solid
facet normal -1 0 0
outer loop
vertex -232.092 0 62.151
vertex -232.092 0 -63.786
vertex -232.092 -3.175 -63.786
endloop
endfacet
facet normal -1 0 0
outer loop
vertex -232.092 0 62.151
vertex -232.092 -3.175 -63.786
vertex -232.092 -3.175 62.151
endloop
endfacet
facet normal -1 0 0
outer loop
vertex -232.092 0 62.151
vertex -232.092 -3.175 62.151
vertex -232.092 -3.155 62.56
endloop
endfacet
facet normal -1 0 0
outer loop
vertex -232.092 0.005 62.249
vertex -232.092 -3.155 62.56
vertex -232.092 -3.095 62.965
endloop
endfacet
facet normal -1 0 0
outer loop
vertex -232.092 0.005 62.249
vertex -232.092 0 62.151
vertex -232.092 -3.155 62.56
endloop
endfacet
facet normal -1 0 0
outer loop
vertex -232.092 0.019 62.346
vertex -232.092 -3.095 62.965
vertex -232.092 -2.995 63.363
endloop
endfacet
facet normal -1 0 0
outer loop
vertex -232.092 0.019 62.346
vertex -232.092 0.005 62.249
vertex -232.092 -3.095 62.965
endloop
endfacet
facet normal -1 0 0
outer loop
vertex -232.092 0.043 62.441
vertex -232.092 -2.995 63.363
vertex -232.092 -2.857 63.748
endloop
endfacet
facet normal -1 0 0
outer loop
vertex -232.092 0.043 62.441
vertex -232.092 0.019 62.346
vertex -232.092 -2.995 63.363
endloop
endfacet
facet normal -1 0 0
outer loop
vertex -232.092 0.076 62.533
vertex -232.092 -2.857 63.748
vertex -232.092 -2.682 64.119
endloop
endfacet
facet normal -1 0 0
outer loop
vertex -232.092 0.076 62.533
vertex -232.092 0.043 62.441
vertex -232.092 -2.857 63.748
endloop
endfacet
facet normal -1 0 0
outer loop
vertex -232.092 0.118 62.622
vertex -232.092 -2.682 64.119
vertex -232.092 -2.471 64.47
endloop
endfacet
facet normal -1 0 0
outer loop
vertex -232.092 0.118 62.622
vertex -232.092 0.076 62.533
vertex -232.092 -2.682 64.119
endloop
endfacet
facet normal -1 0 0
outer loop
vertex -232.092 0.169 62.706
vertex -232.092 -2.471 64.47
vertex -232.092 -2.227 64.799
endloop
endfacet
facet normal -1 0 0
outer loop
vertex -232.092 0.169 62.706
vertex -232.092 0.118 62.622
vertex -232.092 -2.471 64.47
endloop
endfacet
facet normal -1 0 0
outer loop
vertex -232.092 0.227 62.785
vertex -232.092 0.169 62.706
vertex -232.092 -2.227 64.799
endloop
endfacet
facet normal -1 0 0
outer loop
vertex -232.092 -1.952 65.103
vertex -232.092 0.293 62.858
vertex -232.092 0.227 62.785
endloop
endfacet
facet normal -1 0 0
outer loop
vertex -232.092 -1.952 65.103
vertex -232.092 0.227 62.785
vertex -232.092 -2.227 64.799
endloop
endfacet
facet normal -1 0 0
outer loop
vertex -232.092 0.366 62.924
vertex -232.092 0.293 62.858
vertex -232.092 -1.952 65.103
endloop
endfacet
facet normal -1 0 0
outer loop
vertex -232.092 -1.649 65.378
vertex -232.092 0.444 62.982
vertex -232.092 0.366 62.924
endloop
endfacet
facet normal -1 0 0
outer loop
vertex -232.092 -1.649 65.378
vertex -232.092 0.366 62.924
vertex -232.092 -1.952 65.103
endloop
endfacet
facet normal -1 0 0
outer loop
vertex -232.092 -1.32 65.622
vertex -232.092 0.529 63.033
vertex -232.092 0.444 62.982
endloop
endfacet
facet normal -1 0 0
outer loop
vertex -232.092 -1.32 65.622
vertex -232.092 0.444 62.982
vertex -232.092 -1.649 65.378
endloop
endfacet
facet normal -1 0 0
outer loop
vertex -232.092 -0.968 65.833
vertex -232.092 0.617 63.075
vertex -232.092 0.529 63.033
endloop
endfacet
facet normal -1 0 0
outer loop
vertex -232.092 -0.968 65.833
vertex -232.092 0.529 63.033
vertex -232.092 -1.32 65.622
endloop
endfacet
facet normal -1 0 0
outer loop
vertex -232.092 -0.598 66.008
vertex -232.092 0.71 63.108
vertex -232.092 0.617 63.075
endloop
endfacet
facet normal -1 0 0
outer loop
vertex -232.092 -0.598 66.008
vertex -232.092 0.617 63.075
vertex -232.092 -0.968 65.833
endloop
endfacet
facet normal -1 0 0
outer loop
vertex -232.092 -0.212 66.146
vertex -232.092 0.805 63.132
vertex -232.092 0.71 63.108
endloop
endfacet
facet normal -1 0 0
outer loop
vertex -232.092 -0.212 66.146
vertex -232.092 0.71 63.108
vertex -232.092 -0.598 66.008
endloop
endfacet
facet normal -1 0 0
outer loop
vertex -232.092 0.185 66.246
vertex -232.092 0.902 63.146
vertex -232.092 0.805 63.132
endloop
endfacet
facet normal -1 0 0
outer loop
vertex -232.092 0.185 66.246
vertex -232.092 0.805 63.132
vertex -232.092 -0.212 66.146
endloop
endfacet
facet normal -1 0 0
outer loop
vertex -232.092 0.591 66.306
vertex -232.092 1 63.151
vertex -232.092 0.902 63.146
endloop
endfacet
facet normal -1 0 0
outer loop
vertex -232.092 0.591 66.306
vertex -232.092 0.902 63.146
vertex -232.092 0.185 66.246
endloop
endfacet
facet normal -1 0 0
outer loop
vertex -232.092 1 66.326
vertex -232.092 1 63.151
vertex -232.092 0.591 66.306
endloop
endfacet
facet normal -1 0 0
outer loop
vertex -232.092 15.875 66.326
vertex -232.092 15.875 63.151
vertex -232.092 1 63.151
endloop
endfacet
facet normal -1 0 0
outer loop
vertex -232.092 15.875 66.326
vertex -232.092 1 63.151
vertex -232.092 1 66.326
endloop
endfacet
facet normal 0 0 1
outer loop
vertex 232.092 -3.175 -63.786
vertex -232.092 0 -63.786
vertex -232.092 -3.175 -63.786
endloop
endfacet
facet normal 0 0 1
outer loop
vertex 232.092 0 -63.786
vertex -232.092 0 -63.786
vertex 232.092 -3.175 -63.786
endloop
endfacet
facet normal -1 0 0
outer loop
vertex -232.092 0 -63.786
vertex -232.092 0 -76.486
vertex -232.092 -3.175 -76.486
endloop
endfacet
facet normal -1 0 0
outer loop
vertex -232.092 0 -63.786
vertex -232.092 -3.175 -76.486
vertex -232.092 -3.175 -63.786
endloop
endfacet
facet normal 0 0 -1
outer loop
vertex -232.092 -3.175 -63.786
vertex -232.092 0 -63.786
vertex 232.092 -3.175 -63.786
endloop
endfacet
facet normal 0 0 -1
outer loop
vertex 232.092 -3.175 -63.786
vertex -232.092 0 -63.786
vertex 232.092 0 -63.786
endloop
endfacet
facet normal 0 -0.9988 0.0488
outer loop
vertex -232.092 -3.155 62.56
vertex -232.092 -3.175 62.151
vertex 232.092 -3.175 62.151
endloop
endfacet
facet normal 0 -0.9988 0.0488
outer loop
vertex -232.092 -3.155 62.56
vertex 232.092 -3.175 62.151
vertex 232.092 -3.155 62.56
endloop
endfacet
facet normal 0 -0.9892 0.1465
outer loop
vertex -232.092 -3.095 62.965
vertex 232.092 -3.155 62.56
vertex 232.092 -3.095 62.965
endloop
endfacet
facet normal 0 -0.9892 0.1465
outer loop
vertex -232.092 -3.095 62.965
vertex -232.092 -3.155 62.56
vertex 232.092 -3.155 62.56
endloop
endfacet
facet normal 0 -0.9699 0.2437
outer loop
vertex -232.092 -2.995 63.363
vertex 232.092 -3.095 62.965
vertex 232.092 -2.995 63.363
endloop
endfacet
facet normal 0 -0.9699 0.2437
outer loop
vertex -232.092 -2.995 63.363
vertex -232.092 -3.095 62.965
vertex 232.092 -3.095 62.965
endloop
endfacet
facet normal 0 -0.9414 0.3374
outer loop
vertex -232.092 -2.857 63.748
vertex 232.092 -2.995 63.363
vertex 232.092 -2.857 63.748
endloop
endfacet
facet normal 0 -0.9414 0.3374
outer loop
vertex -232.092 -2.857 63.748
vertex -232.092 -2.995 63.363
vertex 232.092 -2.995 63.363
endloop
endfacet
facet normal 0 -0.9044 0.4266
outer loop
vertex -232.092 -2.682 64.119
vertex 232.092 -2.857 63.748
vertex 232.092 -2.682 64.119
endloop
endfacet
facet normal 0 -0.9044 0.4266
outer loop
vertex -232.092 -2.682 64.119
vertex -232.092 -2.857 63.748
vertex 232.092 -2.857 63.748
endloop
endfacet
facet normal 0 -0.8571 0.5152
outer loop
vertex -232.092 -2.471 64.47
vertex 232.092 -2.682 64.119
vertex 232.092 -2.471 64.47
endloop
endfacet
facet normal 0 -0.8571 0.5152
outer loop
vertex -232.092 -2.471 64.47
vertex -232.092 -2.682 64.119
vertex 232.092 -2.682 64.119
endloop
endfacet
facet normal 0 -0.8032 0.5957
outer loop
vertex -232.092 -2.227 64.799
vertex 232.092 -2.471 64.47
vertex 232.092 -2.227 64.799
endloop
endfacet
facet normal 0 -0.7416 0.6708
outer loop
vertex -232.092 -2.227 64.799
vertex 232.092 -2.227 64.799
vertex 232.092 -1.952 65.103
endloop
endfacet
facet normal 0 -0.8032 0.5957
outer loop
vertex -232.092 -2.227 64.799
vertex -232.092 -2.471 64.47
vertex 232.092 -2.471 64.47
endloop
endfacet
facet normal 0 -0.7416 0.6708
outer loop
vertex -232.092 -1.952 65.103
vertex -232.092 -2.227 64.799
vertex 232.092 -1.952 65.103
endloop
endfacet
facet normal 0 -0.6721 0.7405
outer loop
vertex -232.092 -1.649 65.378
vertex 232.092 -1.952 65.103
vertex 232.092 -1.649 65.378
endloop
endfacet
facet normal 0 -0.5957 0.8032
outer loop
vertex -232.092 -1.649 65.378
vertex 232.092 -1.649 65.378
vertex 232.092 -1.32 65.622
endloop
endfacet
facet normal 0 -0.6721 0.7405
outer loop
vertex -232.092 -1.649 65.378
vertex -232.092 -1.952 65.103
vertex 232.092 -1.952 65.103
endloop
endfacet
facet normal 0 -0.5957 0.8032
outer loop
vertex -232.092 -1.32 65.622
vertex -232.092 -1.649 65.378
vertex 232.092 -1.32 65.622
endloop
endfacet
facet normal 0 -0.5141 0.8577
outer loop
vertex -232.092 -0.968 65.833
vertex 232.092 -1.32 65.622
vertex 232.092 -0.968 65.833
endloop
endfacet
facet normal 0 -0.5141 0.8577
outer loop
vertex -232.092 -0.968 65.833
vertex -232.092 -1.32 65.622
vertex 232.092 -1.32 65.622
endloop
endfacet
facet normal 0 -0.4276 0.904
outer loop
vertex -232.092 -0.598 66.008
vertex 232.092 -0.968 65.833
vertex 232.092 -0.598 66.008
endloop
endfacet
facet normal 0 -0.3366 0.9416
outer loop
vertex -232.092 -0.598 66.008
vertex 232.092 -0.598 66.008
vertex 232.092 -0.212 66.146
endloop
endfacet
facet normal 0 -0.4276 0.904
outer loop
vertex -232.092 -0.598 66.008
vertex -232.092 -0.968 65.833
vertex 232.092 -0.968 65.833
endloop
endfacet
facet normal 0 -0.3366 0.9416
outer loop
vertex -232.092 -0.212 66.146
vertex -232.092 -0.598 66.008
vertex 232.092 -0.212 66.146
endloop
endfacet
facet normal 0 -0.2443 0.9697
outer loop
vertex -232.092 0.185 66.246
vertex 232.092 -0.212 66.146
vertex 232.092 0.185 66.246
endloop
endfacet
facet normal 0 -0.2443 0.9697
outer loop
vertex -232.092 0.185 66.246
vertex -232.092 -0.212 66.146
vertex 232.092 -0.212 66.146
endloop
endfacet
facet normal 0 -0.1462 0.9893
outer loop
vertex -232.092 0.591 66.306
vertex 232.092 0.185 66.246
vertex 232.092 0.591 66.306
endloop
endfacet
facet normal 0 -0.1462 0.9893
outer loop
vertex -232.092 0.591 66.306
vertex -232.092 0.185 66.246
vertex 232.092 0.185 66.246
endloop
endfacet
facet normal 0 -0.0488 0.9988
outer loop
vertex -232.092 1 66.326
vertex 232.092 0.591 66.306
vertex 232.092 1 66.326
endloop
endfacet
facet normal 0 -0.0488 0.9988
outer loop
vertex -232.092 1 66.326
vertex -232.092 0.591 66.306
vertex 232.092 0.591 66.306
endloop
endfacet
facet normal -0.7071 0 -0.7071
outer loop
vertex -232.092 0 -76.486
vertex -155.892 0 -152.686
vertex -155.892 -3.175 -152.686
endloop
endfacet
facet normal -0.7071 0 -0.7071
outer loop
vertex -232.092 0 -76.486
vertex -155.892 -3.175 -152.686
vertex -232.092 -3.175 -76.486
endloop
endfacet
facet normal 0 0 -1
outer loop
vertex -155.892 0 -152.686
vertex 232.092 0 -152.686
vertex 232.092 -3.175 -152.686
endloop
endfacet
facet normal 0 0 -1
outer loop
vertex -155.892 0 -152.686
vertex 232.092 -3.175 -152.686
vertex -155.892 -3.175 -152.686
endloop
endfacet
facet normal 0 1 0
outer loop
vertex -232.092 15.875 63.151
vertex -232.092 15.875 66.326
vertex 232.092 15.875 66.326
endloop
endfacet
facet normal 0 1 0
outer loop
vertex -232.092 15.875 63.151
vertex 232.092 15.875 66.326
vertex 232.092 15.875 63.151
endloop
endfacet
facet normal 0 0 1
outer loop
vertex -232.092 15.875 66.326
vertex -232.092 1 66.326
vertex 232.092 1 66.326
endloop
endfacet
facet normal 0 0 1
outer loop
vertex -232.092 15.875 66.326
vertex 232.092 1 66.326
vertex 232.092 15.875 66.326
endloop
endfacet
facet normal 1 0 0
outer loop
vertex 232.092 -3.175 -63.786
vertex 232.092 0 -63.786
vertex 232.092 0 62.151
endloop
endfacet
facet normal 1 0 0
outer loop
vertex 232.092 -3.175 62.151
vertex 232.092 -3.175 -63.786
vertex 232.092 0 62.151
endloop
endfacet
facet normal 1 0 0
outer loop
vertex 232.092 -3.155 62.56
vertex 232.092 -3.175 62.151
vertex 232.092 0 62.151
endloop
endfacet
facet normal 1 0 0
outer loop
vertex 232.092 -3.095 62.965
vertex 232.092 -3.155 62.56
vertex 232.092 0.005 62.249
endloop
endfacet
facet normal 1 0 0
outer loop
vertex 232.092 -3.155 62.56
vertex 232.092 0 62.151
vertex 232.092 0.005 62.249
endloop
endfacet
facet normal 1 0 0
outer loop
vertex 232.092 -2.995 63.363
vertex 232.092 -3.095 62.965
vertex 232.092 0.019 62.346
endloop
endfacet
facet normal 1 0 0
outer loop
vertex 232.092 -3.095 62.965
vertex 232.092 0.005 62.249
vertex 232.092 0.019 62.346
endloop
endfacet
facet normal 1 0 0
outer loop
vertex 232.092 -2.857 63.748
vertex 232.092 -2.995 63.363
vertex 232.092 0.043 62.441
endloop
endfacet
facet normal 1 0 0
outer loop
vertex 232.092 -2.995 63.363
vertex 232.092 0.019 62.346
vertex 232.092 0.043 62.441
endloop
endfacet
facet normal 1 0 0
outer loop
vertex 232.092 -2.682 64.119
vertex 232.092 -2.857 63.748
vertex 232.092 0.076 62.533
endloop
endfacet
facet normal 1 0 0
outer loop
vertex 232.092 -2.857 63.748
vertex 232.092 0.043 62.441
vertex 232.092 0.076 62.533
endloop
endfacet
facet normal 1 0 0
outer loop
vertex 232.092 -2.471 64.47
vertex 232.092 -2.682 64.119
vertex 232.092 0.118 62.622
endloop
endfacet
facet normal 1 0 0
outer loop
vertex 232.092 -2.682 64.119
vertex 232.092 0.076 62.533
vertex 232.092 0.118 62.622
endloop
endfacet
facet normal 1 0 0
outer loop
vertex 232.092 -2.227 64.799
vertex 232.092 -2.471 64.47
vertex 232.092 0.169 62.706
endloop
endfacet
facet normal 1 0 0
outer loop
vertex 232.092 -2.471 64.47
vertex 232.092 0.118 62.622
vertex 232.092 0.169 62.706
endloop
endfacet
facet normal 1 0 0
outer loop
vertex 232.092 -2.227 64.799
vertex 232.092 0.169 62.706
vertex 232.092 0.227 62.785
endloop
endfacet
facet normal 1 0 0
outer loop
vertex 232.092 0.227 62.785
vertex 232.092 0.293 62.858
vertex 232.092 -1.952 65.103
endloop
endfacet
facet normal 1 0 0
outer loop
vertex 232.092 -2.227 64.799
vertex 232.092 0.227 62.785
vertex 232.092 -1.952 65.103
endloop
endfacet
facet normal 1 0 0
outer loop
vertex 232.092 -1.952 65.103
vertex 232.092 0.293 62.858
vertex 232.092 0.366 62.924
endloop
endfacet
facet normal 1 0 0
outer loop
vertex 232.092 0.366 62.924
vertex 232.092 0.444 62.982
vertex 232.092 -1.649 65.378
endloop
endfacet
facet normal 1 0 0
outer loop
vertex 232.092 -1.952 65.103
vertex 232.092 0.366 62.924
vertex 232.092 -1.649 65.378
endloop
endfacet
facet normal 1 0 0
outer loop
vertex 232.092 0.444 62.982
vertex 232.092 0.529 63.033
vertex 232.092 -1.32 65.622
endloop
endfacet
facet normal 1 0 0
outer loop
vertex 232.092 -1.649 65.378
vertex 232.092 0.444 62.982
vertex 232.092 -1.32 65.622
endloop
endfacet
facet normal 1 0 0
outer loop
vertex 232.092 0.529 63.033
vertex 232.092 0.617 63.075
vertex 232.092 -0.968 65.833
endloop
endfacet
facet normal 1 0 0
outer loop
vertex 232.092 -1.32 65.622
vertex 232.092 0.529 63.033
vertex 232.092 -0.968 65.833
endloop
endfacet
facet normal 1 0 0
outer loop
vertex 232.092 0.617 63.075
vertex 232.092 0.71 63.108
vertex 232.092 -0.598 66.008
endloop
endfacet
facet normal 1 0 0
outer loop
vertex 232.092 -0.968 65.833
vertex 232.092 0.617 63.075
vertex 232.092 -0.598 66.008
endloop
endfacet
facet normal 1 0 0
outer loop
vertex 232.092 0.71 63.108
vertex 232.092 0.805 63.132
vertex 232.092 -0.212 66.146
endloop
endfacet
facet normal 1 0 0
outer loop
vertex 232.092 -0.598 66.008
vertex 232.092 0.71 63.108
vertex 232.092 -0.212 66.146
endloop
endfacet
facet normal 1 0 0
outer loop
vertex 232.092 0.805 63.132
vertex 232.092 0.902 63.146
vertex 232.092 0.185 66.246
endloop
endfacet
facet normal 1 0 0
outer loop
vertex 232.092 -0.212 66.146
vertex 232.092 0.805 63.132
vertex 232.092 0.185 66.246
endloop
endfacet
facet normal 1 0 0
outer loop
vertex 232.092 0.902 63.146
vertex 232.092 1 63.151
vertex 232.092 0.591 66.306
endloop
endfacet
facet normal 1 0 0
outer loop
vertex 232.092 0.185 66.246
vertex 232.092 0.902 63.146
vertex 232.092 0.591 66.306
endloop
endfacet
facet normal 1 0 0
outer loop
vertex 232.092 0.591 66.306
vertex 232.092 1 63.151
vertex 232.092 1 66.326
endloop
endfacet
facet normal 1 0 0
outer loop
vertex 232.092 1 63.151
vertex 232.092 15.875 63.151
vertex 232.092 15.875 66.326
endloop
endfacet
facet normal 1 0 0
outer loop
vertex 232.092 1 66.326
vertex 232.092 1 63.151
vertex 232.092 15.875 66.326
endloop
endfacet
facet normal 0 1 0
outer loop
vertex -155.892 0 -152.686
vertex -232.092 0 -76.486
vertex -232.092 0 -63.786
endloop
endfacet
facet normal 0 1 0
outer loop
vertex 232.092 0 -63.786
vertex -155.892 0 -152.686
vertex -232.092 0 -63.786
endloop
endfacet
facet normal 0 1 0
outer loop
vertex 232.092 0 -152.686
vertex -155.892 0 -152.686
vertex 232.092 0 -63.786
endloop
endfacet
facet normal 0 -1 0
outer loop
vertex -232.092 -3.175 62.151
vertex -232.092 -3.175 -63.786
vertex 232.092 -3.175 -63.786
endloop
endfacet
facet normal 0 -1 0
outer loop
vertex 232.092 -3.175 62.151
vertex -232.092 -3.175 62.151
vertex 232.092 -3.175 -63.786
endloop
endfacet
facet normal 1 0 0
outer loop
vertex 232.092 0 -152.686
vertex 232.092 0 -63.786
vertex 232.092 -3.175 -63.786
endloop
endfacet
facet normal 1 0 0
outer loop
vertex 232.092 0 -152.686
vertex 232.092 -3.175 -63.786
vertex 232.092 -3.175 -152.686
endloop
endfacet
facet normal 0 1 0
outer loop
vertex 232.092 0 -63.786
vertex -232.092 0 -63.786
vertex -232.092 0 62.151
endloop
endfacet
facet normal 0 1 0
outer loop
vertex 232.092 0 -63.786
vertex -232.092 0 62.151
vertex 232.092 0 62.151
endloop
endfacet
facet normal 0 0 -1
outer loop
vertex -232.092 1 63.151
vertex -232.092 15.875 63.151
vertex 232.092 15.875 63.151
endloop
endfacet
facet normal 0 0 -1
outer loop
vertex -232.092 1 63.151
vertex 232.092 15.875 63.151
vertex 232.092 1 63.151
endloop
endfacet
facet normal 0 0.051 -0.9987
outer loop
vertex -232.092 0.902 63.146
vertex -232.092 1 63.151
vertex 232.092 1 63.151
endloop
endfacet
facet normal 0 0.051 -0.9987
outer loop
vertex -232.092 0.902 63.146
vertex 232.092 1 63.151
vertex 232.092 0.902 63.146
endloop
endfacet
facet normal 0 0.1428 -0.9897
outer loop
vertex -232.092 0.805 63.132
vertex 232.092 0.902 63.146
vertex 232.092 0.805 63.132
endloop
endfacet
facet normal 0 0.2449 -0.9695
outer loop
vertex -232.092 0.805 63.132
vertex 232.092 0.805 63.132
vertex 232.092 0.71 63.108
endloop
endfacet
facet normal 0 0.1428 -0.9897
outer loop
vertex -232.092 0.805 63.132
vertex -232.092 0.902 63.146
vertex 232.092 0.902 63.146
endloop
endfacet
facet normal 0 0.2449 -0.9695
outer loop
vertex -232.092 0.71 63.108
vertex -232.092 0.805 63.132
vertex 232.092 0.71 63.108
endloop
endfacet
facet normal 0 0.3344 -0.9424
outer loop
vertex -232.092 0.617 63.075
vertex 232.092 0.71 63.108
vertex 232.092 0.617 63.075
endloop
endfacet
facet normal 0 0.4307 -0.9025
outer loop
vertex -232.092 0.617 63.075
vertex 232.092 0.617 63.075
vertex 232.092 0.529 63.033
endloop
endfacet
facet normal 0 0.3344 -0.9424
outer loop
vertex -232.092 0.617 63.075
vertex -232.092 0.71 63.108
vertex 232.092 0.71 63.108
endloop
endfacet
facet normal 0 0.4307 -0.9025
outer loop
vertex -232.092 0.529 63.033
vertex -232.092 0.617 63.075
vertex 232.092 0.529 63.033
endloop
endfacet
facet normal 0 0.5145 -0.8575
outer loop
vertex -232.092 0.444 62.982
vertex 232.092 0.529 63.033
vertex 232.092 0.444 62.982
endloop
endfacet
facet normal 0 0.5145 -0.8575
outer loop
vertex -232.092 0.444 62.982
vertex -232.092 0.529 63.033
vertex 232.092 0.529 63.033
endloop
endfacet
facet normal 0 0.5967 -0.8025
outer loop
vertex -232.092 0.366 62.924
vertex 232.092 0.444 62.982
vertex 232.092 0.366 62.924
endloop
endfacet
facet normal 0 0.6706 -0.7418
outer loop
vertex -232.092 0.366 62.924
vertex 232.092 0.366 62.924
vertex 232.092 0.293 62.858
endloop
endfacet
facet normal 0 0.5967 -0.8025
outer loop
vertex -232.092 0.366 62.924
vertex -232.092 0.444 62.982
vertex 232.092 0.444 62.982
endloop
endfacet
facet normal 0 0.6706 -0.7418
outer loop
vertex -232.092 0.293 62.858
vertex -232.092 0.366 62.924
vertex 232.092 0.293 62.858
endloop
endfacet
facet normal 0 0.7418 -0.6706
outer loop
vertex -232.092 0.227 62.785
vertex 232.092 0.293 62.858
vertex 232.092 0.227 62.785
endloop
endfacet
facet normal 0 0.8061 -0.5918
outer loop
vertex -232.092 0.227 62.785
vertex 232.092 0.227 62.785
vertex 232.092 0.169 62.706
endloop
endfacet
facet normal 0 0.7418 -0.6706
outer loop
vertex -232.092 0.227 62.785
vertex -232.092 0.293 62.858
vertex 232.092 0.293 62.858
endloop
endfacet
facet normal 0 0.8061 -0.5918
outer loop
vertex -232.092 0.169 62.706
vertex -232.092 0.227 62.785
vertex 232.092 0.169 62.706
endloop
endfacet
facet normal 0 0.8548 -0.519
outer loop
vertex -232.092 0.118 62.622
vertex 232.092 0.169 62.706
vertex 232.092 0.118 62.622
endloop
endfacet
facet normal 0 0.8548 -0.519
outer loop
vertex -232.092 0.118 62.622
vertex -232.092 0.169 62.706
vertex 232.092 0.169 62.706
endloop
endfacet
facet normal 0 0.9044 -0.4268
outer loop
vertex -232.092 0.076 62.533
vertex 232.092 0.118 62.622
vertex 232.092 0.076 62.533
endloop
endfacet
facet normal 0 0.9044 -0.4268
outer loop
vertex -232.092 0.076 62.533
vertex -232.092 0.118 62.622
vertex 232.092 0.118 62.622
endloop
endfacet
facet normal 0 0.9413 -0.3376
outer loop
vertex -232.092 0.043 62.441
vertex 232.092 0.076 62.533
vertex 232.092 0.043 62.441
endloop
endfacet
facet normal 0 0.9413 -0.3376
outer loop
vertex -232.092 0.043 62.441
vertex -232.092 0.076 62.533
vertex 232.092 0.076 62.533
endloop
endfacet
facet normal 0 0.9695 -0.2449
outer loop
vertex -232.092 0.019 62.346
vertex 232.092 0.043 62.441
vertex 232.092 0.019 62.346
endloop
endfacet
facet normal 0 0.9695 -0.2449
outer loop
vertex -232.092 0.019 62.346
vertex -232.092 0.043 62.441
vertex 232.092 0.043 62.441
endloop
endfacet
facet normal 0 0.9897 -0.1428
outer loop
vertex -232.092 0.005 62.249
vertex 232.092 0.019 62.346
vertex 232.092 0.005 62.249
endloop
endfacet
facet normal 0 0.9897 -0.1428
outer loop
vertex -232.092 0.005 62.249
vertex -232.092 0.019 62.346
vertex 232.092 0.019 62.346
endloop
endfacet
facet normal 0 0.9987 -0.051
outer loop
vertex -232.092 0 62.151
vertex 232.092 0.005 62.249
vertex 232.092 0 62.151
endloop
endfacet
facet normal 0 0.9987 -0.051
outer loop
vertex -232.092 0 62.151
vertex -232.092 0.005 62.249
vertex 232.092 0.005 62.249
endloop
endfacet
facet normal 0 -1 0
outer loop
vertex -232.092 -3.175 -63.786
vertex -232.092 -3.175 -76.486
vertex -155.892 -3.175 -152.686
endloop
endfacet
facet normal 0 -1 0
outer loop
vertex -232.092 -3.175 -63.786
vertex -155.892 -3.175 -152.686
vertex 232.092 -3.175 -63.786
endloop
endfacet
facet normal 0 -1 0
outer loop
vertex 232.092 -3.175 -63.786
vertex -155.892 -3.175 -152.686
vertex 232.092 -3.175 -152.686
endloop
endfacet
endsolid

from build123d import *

# Parameters (mm, degrees)
POWER_ELECTRONICS_WALL_DEPTH = 3.175
SKETCH5_W                    = 464.185
SKETCH5_H                    = 127.5715
BASE_FLANGE1_DEPTH           = 3.175
EDGE_FLANGE1_STRIP_W         = 17.24
EDGE_FLANGE1_STRIP_H         = 3.175
EDGE_FLANGE1_STRIP_CUT_DEPTH = 464.185
EDGE_FLANGE1_DEPTH           = 464.185


# Sheet-metal steps are written as plain solids
with BuildPart() as part:
    # Sketch2 → Power Electronics Wall (new body)
    with BuildSketch(Plane(origin=(0, 0, 0), x_dir=(1, 0, 0), z_dir=(0, 1, 0))):
        Polygon((-232.0925, 63.78575), (232.0925, 63.78575), (232.0925, 152.68575), (-155.8925, 152.68575), (-232.0925, 76.48575), align=None)
    extrude(amount=-POWER_ELECTRONICS_WALL_DEPTH)


with BuildPart() as body_2:
    # Sketch5 → Base-Flange1 (new body)
    with BuildSketch(Plane(origin=(0, 0, 0), x_dir=(1, 0, 0), z_dir=(0, 1, 0))):
        Rectangle(SKETCH5_W, SKETCH5_H)
    extrude(amount=-BASE_FLANGE1_DEPTH)

    # Edge-Flange1 strip (across the edge) → Edge-Flange1 strip cut (cut)
    with BuildSketch(Plane(origin=(-232.0925, 0, 66.32575), x_dir=(0, 0, -1), z_dir=(1, 0, 0))):
        with Locations((-4.445, -1.5875)):
            Rectangle(EDGE_FLANGE1_STRIP_W, EDGE_FLANGE1_STRIP_H)
    extrude(amount=EDGE_FLANGE1_STRIP_CUT_DEPTH, mode=Mode.SUBTRACT)

    # Edge-Flange1 section (across the edge) → Edge-Flange1 (add)
    with BuildSketch(Plane(origin=(-232.0925, 0, 66.32575), x_dir=(0, 0, -1), z_dir=(1, 0, 0))):
        with BuildLine():
            Line((0, 1), (0, 15.875))
            Line((0, 15.875), (3.175, 15.875))
            Line((3.175, 15.875), (3.175, 1))
            ThreePointArc((3.175, 1), (3.467893219, 0.292893219), (4.175, 0))
            Line((4.175, 0), (4.175, -3.175))
            ThreePointArc((4.175, -3.175), (1.222829189, -1.952170811), (0, 1))
        make_face()
    extrude(amount=EDGE_FLANGE1_DEPTH)


solid = Compound([part.part, body_2.part])
